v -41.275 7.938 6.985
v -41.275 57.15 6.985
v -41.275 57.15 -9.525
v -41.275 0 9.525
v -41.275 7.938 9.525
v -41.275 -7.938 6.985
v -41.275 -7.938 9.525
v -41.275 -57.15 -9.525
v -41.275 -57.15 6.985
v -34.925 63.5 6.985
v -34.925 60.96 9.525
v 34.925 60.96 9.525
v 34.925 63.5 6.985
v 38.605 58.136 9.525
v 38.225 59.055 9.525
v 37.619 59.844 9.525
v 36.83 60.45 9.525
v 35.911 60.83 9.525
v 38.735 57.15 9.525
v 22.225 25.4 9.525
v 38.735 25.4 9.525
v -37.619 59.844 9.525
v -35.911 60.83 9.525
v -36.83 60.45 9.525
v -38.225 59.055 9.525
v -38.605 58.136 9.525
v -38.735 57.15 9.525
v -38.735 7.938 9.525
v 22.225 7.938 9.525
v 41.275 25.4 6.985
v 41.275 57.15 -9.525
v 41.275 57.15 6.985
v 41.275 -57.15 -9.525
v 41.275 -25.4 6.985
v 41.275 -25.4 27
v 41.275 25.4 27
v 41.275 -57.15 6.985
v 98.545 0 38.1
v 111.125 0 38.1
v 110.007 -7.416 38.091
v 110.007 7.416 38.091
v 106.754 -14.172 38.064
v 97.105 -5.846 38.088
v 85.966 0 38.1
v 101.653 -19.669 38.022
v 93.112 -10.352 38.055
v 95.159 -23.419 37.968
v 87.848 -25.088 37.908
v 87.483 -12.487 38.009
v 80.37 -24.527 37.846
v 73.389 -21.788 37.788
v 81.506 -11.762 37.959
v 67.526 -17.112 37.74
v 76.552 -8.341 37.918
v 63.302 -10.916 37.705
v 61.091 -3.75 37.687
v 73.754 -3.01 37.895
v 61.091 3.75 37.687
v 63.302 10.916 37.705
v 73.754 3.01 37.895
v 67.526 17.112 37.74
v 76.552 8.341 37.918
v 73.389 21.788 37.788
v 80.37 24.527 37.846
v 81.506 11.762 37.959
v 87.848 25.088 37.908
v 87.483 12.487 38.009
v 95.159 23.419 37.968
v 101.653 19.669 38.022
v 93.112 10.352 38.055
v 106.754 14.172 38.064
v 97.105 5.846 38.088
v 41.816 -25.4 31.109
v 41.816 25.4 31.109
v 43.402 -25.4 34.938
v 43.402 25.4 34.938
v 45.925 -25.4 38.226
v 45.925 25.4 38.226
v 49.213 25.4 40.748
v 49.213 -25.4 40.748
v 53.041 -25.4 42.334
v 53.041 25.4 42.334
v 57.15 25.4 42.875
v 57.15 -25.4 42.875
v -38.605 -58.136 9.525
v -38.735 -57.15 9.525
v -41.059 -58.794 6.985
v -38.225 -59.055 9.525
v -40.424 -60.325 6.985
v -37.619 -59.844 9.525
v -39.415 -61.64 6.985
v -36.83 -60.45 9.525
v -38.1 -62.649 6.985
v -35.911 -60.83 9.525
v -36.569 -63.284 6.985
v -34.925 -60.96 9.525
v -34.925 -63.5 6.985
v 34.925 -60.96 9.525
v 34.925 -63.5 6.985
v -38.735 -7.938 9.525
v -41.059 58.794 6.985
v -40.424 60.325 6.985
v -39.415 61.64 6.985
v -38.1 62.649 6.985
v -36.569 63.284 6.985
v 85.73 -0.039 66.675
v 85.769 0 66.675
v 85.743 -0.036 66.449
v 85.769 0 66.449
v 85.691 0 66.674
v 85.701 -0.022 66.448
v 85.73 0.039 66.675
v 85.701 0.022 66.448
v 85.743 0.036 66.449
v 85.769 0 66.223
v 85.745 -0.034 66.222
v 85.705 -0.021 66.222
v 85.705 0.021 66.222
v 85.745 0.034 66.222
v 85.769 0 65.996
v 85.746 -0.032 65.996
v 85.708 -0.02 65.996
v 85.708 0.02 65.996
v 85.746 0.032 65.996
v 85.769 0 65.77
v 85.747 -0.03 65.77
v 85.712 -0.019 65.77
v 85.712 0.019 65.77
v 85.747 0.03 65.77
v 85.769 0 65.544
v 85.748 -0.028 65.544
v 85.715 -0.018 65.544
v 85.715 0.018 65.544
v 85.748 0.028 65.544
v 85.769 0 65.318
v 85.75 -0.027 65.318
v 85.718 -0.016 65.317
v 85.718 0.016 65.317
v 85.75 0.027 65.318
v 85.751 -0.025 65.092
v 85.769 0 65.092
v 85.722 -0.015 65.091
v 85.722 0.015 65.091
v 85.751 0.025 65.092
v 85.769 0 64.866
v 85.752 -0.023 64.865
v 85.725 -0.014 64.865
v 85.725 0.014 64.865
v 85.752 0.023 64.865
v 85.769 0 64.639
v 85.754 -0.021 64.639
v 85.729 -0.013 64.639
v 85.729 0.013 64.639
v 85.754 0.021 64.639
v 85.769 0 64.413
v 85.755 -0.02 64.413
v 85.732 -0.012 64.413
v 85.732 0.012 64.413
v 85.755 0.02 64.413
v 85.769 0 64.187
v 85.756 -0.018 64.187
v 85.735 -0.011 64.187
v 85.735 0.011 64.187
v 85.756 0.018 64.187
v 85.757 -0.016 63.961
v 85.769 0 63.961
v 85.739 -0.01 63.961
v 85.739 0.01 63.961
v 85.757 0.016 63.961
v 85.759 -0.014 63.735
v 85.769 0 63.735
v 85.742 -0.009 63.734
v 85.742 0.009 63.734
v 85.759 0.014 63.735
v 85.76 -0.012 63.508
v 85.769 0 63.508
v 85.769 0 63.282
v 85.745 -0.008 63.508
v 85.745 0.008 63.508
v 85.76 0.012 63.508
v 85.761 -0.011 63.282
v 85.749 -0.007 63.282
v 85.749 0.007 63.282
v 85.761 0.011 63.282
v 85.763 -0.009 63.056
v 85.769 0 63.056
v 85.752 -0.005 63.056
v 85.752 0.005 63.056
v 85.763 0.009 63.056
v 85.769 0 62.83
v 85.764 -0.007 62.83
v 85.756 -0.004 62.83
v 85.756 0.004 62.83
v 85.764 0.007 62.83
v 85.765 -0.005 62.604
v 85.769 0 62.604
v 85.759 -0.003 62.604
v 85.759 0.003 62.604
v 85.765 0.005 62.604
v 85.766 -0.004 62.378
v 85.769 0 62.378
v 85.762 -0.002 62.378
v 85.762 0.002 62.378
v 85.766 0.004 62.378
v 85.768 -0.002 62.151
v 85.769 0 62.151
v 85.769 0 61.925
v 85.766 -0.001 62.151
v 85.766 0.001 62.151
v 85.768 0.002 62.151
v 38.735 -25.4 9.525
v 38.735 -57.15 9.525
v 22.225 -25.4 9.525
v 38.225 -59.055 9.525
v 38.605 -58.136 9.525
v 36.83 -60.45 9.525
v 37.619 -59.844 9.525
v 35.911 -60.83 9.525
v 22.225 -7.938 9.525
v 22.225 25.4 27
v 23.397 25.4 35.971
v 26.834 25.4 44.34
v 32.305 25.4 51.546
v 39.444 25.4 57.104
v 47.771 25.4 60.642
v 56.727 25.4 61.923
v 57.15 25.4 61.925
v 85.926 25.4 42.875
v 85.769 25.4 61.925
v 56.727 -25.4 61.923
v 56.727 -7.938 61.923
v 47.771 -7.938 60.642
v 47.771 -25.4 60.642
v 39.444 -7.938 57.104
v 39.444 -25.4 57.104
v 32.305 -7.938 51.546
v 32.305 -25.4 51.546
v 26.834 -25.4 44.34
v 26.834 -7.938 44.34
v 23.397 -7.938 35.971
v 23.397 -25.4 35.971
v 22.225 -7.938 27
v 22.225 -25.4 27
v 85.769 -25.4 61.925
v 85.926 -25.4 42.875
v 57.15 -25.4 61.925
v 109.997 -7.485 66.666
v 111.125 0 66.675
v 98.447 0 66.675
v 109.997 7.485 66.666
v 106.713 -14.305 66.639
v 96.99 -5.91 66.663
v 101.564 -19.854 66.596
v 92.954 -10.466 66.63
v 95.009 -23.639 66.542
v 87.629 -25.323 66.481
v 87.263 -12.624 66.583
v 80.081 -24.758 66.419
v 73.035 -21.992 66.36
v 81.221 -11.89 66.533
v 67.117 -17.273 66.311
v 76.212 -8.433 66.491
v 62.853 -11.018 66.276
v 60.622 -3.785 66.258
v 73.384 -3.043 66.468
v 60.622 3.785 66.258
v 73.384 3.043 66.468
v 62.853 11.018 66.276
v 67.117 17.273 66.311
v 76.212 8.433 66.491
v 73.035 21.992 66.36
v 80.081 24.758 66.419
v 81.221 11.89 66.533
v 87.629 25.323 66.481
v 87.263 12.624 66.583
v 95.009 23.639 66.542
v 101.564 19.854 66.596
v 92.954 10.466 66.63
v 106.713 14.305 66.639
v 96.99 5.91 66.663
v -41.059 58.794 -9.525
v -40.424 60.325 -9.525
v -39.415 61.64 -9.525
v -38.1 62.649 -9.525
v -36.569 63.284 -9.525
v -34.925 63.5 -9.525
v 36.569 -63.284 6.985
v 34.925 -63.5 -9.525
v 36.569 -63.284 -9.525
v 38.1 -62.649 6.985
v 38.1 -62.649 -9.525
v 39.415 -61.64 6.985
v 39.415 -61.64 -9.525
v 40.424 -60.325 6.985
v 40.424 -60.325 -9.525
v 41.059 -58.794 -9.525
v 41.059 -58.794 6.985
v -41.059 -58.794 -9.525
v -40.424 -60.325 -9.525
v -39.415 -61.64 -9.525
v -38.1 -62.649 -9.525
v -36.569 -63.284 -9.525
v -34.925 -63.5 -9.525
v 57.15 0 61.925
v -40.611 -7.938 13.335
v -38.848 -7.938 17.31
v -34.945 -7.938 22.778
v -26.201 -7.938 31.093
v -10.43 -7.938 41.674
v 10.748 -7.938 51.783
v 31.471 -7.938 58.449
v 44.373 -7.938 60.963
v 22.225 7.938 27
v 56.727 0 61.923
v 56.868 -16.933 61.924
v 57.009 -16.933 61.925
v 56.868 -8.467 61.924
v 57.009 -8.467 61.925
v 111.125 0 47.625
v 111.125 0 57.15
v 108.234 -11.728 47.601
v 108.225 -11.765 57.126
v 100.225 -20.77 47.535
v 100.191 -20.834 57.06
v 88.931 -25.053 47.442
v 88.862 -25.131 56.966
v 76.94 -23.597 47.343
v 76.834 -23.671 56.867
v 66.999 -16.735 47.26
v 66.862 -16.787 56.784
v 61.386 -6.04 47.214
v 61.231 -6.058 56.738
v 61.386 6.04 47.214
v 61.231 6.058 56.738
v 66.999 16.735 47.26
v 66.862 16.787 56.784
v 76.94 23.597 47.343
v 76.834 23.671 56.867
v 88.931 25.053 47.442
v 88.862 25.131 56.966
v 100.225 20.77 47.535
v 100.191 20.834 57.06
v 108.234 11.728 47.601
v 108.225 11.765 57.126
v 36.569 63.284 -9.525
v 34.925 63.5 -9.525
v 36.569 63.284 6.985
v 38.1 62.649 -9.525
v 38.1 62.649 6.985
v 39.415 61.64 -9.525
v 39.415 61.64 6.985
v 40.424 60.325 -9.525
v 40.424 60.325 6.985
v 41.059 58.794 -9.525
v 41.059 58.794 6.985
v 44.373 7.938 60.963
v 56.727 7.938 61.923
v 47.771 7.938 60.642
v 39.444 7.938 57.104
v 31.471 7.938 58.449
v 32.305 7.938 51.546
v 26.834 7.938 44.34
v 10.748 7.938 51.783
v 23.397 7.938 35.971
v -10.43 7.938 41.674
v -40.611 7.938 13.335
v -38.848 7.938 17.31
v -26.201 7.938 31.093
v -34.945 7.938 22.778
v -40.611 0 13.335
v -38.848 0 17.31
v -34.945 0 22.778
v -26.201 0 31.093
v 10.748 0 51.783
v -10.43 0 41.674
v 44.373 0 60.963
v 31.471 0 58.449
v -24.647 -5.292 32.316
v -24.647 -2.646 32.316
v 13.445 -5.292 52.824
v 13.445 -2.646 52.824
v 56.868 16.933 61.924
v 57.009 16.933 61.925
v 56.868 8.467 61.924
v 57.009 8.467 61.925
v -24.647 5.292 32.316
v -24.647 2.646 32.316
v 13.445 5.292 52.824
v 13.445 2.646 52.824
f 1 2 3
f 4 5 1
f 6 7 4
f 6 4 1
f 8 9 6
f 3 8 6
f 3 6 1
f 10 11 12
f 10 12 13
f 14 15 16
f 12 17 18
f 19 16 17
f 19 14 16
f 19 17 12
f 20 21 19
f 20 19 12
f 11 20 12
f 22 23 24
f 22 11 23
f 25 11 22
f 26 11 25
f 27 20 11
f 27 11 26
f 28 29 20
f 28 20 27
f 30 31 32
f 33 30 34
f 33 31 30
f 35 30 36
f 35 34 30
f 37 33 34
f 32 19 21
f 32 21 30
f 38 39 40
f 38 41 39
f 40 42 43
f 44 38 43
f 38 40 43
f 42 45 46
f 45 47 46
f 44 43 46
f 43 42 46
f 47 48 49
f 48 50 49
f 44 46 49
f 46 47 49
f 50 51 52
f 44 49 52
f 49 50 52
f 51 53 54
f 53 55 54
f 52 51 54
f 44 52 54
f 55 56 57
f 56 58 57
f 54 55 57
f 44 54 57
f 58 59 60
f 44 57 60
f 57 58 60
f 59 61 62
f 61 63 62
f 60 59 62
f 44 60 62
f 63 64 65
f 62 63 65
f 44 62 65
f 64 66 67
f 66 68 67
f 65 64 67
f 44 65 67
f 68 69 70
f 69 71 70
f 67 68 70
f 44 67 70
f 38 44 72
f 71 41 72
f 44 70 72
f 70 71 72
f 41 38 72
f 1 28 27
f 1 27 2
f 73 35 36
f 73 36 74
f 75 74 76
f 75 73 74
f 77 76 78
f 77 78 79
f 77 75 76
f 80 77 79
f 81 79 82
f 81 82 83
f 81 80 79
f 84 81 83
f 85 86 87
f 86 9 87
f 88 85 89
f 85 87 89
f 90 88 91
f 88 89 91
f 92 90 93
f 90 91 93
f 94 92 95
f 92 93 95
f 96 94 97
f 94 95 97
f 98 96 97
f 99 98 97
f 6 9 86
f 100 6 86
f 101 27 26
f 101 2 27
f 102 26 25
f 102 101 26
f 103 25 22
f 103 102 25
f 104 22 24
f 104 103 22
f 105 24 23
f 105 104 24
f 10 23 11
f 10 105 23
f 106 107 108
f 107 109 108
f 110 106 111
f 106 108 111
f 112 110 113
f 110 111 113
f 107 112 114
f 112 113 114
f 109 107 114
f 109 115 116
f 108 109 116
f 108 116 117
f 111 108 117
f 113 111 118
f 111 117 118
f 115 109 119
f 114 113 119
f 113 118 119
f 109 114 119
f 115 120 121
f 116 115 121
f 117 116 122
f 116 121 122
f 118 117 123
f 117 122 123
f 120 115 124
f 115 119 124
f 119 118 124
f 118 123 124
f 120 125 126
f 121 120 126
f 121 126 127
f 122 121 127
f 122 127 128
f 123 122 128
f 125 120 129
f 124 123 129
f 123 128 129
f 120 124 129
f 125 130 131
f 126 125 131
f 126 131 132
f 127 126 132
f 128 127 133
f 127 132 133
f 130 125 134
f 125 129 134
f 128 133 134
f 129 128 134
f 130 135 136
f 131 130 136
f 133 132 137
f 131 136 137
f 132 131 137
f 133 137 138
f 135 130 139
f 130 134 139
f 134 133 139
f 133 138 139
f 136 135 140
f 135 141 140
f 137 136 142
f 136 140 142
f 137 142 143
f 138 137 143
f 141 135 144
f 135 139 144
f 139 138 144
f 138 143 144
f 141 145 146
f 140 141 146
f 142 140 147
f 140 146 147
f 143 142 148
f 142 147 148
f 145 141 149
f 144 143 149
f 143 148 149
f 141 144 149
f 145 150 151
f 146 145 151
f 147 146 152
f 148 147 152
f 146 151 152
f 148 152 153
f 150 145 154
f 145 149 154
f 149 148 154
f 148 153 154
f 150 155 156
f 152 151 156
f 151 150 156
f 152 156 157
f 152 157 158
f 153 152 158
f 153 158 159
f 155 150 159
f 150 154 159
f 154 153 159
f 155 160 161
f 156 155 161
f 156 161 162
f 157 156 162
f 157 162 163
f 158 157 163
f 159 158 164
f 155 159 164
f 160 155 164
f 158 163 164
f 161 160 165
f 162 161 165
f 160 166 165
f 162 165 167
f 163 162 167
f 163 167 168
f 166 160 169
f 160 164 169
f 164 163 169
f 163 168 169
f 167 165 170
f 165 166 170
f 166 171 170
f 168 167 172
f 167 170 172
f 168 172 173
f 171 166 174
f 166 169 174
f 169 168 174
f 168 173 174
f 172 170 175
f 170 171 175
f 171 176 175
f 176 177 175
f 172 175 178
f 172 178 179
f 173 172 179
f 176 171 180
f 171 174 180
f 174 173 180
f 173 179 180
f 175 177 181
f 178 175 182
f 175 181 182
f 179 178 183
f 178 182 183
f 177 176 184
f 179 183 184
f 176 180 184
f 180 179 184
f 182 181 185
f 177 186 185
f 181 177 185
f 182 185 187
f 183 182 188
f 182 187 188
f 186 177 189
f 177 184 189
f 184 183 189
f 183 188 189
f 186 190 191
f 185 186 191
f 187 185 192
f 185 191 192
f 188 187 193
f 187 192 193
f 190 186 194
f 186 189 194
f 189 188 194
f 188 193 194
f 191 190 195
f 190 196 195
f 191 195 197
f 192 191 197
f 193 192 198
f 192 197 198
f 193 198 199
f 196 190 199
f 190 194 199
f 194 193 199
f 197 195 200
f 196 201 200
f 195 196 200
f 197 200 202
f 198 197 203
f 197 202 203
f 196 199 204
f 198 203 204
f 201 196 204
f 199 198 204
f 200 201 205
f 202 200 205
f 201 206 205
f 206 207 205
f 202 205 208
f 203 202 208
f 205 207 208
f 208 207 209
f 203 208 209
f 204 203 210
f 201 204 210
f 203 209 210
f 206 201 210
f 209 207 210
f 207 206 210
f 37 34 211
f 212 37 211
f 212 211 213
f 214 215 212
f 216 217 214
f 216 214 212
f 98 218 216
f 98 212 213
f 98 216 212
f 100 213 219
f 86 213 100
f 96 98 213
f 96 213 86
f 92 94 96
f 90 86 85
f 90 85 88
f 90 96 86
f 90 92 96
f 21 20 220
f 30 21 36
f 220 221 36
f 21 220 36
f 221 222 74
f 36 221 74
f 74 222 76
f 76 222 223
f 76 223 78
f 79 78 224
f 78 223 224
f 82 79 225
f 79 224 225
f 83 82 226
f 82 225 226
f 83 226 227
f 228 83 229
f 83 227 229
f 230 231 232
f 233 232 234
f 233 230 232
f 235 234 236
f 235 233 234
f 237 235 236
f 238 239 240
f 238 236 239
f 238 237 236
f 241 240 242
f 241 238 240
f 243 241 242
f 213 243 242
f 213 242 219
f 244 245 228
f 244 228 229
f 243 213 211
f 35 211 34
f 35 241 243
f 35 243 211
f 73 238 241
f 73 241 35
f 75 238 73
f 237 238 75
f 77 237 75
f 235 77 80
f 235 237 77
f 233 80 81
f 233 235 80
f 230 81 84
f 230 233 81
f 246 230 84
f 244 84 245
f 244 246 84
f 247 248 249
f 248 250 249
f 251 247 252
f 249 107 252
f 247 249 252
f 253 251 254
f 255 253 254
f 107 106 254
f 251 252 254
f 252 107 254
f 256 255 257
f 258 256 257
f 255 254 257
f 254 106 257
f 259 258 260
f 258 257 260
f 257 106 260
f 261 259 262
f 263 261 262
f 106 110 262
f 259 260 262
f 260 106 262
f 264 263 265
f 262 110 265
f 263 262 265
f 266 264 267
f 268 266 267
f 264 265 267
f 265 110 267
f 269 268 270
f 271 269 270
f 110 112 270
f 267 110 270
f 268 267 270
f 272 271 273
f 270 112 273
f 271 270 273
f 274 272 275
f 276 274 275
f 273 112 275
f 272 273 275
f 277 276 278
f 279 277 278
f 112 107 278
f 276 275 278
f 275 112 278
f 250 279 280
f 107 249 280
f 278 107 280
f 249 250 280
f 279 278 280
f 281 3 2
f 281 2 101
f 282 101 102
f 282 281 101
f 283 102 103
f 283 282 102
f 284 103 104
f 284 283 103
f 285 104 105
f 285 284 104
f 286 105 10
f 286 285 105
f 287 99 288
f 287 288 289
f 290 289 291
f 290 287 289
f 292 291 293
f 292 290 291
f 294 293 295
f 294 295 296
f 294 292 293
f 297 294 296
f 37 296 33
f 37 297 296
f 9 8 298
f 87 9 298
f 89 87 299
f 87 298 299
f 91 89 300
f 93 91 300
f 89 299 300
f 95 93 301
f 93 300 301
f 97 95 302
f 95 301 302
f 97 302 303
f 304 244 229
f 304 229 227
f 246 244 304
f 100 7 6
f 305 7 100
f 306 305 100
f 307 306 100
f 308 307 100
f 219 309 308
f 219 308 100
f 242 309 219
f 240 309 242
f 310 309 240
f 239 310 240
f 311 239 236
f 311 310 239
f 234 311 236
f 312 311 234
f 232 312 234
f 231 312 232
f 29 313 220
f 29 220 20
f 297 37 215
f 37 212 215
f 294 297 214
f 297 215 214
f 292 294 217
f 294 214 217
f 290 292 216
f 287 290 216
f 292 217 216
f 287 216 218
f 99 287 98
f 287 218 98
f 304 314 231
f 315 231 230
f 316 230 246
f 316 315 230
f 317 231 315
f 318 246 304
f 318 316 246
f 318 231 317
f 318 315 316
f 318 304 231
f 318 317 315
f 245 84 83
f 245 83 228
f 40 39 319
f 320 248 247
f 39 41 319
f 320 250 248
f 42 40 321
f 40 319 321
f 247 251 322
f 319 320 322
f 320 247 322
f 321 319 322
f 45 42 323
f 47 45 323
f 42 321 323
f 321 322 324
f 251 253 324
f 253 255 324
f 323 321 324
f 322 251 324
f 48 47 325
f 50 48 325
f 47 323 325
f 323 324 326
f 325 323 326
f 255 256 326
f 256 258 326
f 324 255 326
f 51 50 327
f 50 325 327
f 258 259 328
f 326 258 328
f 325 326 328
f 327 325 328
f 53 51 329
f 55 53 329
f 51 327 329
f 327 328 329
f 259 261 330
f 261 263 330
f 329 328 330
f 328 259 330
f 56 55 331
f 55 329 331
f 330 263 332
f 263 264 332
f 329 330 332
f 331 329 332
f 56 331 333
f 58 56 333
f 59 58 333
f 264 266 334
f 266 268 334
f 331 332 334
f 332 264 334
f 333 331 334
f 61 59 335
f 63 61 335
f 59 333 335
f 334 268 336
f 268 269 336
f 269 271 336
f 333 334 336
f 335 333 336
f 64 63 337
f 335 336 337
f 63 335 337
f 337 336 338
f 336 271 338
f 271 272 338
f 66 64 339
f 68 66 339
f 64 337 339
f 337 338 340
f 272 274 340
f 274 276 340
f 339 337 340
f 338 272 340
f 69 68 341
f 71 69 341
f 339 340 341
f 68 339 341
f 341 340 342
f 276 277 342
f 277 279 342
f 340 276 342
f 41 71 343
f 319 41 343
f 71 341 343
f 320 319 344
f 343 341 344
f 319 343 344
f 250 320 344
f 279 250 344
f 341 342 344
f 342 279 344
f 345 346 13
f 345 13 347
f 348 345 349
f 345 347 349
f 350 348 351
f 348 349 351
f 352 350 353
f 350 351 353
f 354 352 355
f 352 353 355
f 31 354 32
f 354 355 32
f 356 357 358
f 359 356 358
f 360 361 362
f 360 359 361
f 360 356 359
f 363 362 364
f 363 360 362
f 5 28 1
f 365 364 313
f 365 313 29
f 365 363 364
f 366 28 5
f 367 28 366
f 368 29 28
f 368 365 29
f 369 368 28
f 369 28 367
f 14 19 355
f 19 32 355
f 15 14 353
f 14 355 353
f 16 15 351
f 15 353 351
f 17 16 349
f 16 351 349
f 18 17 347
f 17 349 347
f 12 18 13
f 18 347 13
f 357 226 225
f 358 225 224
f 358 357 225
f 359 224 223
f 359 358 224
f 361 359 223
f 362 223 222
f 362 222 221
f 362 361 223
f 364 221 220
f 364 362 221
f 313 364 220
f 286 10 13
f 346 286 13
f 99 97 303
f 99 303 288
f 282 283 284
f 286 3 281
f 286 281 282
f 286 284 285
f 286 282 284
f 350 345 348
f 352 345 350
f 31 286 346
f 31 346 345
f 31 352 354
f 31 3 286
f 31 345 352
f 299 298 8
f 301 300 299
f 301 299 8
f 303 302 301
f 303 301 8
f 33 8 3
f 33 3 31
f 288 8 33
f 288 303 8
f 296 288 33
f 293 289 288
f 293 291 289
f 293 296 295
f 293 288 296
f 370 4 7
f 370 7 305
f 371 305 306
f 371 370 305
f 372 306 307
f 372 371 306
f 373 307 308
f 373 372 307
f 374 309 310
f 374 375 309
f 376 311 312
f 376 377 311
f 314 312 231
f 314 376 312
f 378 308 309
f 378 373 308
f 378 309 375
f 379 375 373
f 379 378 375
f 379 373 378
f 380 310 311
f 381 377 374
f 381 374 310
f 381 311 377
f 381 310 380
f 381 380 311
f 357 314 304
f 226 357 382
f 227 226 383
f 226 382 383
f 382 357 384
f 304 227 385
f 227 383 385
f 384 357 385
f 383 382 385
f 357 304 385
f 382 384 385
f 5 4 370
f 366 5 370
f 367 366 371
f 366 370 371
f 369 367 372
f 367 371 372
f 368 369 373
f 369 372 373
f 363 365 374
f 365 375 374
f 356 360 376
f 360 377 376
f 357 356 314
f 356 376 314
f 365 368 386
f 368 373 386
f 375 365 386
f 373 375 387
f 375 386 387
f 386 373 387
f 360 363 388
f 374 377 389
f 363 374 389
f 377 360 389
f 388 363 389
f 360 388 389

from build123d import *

# Parameters (mm, degrees)
F1_DEPTH     = 63.5
F2_DEPTH     = 25.4
F3_DEPTH     = 7.9375
F5_R         = 6.35
F7_T1_DEPTH  = 69.85
F7_T3_DEPTH  = 31.75
F7_T5_DEPTH  = 49.2125
F7_T7_DEPTH  = 31.75
F7_T9_DEPTH  = 49.2125
F7_T12_ANGLE = 90
F7_T14_ANGLE = 90
F7_T16_ANGLE = 90
F7_T18_ANGLE = 90


# Not quite as in the source:
# - a fillet or chamfer that OpenCascade refuses, or shapes differently, is made with other operations: its cross-section is extruded or revolved along the edge and cut away or added
# - a feature of the source that left no trace in its solid (it failed there, or was rolled back) is left out


with BuildPart() as f1:
    # F0 (on Front) → F1 (new body, symmetric)
    with BuildSketch(Plane.XZ):
        Polygon((22.225, 9.525), (-41.275, 9.525), (-41.275, -9.525), (41.275, -9.525), (41.275, 9.525), align=None)
    extrude(amount=F1_DEPTH, both=True)

    # F0 (on Front) → F2 (join, symmetric)
    with BuildSketch(Plane.XZ):
        with BuildLine():
            Line((22.225, 27.0002), (22.225, 9.525))
            Line((22.225, 9.525), (41.275, 9.525))
            Line((41.275, 9.525), (41.275, 27.0002))
            ThreePointArc((41.275, 27.0002), (45.9246798487, 38.2255201513), (57.15, 42.8752))
            Line((57.15, 42.8752), (60.325, 42.8752))
            Line((60.325, 42.8752), (60.325, 61.9252))
            Line((60.325, 61.9252), (57.15, 61.9252))
            add(Edge.make_bspline(
                [(56.7267505246, 61.9226352656), (56.8680376244, 61.9238665385), (57.0091218232, 61.9247220333), (57.15, 61.9252)],
                knots=[111.1164220424, 111.1164220424, 111.1164220424, 111.1164220424, 111.5045361635, 111.5045361635, 111.5045361635, 111.5045361635], degree=3))
            ThreePointArc((56.7267505246, 61.9226352656), (32.3051050221, 51.5458069091), (22.225, 27.0002))
        make_face()
        Polygon((85.769072175, 61.9252), (60.325, 61.9252), (60.325, 42.8752), (85.9264696617, 42.8752), align=None)
    extrude(amount=F2_DEPTH, both=True)

    # F0 (on Front) → F3 (join, symmetric)
    with BuildSketch(Plane.XZ):
        with BuildLine():
            add(Edge.make_bspline(
                [(-41.275, 9.525), (-40.8048993717, 30.4163066823), (16.2764907719, 61.5701239012), (56.7267505246, 61.9226352656)],
                knots=[0, 0, 0, 0, 111.1164220424, 111.1164220424, 111.1164220424, 111.1164220424], degree=3))
            Line((-41.275, 9.525), (22.225, 9.525))
            Line((22.225, 9.525), (22.225, 27.0002))
            ThreePointArc((22.225, 27.0002), (32.3051050221, 51.5458069091), (56.7267505246, 61.9226352656))
        make_face()
    extrude(amount=F3_DEPTH, both=True)

    # F5
    f5_edges = [f1.edges().sort_by_distance(p)[0] for p in [
        (-41.275, 63.5, 0),
        (-41.275, -63.5, 0),
        (41.275, -63.5, 0),
        (41.275, 63.5, 0),
    ]]
    fillet(f5_edges, radius=F5_R)

    # F7: chamfer of 2.54 on 10 edges, made by hand

    # F7_s2 → F7_t1 (cut)
    with BuildSketch(Plane.YZ.offset(-34.925)):
        Polygon((60.96, 9.525), (63.5, 6.985), (63.5, 9.525), align=None)
        Polygon((-60.96, 9.525), (-63.5, 6.985), (-63.5, 9.525), align=None)
    extrude(amount=F7_T1_DEPTH, mode=Mode.SUBTRACT)

    # F7_s4 → F7_t3 (cut)
    with BuildSketch(Plane.XZ.offset(-57.15)):
        Polygon((38.735, 9.525), (41.275, 6.985), (41.275, 9.525), align=None)
    extrude(amount=F7_T3_DEPTH, mode=Mode.SUBTRACT)

    # F7_s6 → F7_t5 (cut)
    with BuildSketch(Plane.XZ.offset(-57.15)):
        Polygon((-38.735, 9.525), (-41.275, 6.985), (-41.275, 9.525), align=None)
    extrude(amount=F7_T5_DEPTH, mode=Mode.SUBTRACT)

    # F7_s8 → F7_t7 (cut)
    with BuildSketch(Plane.XZ.offset(25.4)):
        Polygon((41.275, 6.985), (38.735, 9.525), (41.275, 9.525), align=None)
    extrude(amount=F7_T7_DEPTH, mode=Mode.SUBTRACT)

    # F7_s10 → F7_t9 (cut)
    with BuildSketch(Plane.XZ.offset(7.9375)):
        Polygon((-41.275, 6.985), (-38.735, 9.525), (-41.275, 9.525), align=None)
    extrude(amount=F7_T9_DEPTH, mode=Mode.SUBTRACT)

    # F7_s11 → F7_t12 (revolve, cut)
    with BuildSketch(Plane.XZ.offset(-57.15)):
        Polygon((38.735, 9.525), (41.275, 6.985), (41.275, 9.525), align=None)
    revolve(axis=Axis((34.925, 57.15, 9.525), (0, 0, 1)), revolution_arc=F7_T12_ANGLE, mode=Mode.SUBTRACT)

    # F7_s13 → F7_t14 (revolve, cut)
    with BuildSketch(Plane.XZ.offset(-57.15)):
        Polygon((-38.735, 9.525), (-41.275, 6.985), (-41.275, 9.525), align=None)
    revolve(axis=Axis((-34.925, 57.15, 9.525), (0, 0, -1)), revolution_arc=F7_T14_ANGLE, mode=Mode.SUBTRACT)

    # F7_s15 → F7_t16 (revolve, cut)
    with BuildSketch(Plane.XZ.offset(57.15)):
        Polygon((41.275, 6.985), (38.735, 9.525), (41.275, 9.525), align=None)
    revolve(axis=Axis((34.925, -57.15, 9.525), (0, 0, -1)), revolution_arc=F7_T16_ANGLE, mode=Mode.SUBTRACT)

    # F7_s17 → F7_t18 (revolve, cut)
    with BuildSketch(Plane.XZ.offset(57.15)):
        Polygon((-38.735, 9.525), (-41.275, 6.985), (-41.275, 9.525), align=None)
    revolve(axis=Axis((-34.925, -57.15, 9.525), (0, 0, 1)), revolution_arc=F7_T18_ANGLE, mode=Mode.SUBTRACT)


with BuildPart() as f4:
    # F0 (on Front) → F4 (revolve)
    with BuildSketch(Plane.XZ):
        Polygon((85.769072175, 66.675), (85.769072175, 61.9252), (85.9264696617, 42.8752), (85.965923965, 38.1), (111.125, 38.1), (111.125, 66.675), align=None)
    revolve(axis=Axis((85.86749807, 0, 50.0126), (0.0082620533, 0, -0.9999658687)))


solid = Compound([f1.part, f4.part])
